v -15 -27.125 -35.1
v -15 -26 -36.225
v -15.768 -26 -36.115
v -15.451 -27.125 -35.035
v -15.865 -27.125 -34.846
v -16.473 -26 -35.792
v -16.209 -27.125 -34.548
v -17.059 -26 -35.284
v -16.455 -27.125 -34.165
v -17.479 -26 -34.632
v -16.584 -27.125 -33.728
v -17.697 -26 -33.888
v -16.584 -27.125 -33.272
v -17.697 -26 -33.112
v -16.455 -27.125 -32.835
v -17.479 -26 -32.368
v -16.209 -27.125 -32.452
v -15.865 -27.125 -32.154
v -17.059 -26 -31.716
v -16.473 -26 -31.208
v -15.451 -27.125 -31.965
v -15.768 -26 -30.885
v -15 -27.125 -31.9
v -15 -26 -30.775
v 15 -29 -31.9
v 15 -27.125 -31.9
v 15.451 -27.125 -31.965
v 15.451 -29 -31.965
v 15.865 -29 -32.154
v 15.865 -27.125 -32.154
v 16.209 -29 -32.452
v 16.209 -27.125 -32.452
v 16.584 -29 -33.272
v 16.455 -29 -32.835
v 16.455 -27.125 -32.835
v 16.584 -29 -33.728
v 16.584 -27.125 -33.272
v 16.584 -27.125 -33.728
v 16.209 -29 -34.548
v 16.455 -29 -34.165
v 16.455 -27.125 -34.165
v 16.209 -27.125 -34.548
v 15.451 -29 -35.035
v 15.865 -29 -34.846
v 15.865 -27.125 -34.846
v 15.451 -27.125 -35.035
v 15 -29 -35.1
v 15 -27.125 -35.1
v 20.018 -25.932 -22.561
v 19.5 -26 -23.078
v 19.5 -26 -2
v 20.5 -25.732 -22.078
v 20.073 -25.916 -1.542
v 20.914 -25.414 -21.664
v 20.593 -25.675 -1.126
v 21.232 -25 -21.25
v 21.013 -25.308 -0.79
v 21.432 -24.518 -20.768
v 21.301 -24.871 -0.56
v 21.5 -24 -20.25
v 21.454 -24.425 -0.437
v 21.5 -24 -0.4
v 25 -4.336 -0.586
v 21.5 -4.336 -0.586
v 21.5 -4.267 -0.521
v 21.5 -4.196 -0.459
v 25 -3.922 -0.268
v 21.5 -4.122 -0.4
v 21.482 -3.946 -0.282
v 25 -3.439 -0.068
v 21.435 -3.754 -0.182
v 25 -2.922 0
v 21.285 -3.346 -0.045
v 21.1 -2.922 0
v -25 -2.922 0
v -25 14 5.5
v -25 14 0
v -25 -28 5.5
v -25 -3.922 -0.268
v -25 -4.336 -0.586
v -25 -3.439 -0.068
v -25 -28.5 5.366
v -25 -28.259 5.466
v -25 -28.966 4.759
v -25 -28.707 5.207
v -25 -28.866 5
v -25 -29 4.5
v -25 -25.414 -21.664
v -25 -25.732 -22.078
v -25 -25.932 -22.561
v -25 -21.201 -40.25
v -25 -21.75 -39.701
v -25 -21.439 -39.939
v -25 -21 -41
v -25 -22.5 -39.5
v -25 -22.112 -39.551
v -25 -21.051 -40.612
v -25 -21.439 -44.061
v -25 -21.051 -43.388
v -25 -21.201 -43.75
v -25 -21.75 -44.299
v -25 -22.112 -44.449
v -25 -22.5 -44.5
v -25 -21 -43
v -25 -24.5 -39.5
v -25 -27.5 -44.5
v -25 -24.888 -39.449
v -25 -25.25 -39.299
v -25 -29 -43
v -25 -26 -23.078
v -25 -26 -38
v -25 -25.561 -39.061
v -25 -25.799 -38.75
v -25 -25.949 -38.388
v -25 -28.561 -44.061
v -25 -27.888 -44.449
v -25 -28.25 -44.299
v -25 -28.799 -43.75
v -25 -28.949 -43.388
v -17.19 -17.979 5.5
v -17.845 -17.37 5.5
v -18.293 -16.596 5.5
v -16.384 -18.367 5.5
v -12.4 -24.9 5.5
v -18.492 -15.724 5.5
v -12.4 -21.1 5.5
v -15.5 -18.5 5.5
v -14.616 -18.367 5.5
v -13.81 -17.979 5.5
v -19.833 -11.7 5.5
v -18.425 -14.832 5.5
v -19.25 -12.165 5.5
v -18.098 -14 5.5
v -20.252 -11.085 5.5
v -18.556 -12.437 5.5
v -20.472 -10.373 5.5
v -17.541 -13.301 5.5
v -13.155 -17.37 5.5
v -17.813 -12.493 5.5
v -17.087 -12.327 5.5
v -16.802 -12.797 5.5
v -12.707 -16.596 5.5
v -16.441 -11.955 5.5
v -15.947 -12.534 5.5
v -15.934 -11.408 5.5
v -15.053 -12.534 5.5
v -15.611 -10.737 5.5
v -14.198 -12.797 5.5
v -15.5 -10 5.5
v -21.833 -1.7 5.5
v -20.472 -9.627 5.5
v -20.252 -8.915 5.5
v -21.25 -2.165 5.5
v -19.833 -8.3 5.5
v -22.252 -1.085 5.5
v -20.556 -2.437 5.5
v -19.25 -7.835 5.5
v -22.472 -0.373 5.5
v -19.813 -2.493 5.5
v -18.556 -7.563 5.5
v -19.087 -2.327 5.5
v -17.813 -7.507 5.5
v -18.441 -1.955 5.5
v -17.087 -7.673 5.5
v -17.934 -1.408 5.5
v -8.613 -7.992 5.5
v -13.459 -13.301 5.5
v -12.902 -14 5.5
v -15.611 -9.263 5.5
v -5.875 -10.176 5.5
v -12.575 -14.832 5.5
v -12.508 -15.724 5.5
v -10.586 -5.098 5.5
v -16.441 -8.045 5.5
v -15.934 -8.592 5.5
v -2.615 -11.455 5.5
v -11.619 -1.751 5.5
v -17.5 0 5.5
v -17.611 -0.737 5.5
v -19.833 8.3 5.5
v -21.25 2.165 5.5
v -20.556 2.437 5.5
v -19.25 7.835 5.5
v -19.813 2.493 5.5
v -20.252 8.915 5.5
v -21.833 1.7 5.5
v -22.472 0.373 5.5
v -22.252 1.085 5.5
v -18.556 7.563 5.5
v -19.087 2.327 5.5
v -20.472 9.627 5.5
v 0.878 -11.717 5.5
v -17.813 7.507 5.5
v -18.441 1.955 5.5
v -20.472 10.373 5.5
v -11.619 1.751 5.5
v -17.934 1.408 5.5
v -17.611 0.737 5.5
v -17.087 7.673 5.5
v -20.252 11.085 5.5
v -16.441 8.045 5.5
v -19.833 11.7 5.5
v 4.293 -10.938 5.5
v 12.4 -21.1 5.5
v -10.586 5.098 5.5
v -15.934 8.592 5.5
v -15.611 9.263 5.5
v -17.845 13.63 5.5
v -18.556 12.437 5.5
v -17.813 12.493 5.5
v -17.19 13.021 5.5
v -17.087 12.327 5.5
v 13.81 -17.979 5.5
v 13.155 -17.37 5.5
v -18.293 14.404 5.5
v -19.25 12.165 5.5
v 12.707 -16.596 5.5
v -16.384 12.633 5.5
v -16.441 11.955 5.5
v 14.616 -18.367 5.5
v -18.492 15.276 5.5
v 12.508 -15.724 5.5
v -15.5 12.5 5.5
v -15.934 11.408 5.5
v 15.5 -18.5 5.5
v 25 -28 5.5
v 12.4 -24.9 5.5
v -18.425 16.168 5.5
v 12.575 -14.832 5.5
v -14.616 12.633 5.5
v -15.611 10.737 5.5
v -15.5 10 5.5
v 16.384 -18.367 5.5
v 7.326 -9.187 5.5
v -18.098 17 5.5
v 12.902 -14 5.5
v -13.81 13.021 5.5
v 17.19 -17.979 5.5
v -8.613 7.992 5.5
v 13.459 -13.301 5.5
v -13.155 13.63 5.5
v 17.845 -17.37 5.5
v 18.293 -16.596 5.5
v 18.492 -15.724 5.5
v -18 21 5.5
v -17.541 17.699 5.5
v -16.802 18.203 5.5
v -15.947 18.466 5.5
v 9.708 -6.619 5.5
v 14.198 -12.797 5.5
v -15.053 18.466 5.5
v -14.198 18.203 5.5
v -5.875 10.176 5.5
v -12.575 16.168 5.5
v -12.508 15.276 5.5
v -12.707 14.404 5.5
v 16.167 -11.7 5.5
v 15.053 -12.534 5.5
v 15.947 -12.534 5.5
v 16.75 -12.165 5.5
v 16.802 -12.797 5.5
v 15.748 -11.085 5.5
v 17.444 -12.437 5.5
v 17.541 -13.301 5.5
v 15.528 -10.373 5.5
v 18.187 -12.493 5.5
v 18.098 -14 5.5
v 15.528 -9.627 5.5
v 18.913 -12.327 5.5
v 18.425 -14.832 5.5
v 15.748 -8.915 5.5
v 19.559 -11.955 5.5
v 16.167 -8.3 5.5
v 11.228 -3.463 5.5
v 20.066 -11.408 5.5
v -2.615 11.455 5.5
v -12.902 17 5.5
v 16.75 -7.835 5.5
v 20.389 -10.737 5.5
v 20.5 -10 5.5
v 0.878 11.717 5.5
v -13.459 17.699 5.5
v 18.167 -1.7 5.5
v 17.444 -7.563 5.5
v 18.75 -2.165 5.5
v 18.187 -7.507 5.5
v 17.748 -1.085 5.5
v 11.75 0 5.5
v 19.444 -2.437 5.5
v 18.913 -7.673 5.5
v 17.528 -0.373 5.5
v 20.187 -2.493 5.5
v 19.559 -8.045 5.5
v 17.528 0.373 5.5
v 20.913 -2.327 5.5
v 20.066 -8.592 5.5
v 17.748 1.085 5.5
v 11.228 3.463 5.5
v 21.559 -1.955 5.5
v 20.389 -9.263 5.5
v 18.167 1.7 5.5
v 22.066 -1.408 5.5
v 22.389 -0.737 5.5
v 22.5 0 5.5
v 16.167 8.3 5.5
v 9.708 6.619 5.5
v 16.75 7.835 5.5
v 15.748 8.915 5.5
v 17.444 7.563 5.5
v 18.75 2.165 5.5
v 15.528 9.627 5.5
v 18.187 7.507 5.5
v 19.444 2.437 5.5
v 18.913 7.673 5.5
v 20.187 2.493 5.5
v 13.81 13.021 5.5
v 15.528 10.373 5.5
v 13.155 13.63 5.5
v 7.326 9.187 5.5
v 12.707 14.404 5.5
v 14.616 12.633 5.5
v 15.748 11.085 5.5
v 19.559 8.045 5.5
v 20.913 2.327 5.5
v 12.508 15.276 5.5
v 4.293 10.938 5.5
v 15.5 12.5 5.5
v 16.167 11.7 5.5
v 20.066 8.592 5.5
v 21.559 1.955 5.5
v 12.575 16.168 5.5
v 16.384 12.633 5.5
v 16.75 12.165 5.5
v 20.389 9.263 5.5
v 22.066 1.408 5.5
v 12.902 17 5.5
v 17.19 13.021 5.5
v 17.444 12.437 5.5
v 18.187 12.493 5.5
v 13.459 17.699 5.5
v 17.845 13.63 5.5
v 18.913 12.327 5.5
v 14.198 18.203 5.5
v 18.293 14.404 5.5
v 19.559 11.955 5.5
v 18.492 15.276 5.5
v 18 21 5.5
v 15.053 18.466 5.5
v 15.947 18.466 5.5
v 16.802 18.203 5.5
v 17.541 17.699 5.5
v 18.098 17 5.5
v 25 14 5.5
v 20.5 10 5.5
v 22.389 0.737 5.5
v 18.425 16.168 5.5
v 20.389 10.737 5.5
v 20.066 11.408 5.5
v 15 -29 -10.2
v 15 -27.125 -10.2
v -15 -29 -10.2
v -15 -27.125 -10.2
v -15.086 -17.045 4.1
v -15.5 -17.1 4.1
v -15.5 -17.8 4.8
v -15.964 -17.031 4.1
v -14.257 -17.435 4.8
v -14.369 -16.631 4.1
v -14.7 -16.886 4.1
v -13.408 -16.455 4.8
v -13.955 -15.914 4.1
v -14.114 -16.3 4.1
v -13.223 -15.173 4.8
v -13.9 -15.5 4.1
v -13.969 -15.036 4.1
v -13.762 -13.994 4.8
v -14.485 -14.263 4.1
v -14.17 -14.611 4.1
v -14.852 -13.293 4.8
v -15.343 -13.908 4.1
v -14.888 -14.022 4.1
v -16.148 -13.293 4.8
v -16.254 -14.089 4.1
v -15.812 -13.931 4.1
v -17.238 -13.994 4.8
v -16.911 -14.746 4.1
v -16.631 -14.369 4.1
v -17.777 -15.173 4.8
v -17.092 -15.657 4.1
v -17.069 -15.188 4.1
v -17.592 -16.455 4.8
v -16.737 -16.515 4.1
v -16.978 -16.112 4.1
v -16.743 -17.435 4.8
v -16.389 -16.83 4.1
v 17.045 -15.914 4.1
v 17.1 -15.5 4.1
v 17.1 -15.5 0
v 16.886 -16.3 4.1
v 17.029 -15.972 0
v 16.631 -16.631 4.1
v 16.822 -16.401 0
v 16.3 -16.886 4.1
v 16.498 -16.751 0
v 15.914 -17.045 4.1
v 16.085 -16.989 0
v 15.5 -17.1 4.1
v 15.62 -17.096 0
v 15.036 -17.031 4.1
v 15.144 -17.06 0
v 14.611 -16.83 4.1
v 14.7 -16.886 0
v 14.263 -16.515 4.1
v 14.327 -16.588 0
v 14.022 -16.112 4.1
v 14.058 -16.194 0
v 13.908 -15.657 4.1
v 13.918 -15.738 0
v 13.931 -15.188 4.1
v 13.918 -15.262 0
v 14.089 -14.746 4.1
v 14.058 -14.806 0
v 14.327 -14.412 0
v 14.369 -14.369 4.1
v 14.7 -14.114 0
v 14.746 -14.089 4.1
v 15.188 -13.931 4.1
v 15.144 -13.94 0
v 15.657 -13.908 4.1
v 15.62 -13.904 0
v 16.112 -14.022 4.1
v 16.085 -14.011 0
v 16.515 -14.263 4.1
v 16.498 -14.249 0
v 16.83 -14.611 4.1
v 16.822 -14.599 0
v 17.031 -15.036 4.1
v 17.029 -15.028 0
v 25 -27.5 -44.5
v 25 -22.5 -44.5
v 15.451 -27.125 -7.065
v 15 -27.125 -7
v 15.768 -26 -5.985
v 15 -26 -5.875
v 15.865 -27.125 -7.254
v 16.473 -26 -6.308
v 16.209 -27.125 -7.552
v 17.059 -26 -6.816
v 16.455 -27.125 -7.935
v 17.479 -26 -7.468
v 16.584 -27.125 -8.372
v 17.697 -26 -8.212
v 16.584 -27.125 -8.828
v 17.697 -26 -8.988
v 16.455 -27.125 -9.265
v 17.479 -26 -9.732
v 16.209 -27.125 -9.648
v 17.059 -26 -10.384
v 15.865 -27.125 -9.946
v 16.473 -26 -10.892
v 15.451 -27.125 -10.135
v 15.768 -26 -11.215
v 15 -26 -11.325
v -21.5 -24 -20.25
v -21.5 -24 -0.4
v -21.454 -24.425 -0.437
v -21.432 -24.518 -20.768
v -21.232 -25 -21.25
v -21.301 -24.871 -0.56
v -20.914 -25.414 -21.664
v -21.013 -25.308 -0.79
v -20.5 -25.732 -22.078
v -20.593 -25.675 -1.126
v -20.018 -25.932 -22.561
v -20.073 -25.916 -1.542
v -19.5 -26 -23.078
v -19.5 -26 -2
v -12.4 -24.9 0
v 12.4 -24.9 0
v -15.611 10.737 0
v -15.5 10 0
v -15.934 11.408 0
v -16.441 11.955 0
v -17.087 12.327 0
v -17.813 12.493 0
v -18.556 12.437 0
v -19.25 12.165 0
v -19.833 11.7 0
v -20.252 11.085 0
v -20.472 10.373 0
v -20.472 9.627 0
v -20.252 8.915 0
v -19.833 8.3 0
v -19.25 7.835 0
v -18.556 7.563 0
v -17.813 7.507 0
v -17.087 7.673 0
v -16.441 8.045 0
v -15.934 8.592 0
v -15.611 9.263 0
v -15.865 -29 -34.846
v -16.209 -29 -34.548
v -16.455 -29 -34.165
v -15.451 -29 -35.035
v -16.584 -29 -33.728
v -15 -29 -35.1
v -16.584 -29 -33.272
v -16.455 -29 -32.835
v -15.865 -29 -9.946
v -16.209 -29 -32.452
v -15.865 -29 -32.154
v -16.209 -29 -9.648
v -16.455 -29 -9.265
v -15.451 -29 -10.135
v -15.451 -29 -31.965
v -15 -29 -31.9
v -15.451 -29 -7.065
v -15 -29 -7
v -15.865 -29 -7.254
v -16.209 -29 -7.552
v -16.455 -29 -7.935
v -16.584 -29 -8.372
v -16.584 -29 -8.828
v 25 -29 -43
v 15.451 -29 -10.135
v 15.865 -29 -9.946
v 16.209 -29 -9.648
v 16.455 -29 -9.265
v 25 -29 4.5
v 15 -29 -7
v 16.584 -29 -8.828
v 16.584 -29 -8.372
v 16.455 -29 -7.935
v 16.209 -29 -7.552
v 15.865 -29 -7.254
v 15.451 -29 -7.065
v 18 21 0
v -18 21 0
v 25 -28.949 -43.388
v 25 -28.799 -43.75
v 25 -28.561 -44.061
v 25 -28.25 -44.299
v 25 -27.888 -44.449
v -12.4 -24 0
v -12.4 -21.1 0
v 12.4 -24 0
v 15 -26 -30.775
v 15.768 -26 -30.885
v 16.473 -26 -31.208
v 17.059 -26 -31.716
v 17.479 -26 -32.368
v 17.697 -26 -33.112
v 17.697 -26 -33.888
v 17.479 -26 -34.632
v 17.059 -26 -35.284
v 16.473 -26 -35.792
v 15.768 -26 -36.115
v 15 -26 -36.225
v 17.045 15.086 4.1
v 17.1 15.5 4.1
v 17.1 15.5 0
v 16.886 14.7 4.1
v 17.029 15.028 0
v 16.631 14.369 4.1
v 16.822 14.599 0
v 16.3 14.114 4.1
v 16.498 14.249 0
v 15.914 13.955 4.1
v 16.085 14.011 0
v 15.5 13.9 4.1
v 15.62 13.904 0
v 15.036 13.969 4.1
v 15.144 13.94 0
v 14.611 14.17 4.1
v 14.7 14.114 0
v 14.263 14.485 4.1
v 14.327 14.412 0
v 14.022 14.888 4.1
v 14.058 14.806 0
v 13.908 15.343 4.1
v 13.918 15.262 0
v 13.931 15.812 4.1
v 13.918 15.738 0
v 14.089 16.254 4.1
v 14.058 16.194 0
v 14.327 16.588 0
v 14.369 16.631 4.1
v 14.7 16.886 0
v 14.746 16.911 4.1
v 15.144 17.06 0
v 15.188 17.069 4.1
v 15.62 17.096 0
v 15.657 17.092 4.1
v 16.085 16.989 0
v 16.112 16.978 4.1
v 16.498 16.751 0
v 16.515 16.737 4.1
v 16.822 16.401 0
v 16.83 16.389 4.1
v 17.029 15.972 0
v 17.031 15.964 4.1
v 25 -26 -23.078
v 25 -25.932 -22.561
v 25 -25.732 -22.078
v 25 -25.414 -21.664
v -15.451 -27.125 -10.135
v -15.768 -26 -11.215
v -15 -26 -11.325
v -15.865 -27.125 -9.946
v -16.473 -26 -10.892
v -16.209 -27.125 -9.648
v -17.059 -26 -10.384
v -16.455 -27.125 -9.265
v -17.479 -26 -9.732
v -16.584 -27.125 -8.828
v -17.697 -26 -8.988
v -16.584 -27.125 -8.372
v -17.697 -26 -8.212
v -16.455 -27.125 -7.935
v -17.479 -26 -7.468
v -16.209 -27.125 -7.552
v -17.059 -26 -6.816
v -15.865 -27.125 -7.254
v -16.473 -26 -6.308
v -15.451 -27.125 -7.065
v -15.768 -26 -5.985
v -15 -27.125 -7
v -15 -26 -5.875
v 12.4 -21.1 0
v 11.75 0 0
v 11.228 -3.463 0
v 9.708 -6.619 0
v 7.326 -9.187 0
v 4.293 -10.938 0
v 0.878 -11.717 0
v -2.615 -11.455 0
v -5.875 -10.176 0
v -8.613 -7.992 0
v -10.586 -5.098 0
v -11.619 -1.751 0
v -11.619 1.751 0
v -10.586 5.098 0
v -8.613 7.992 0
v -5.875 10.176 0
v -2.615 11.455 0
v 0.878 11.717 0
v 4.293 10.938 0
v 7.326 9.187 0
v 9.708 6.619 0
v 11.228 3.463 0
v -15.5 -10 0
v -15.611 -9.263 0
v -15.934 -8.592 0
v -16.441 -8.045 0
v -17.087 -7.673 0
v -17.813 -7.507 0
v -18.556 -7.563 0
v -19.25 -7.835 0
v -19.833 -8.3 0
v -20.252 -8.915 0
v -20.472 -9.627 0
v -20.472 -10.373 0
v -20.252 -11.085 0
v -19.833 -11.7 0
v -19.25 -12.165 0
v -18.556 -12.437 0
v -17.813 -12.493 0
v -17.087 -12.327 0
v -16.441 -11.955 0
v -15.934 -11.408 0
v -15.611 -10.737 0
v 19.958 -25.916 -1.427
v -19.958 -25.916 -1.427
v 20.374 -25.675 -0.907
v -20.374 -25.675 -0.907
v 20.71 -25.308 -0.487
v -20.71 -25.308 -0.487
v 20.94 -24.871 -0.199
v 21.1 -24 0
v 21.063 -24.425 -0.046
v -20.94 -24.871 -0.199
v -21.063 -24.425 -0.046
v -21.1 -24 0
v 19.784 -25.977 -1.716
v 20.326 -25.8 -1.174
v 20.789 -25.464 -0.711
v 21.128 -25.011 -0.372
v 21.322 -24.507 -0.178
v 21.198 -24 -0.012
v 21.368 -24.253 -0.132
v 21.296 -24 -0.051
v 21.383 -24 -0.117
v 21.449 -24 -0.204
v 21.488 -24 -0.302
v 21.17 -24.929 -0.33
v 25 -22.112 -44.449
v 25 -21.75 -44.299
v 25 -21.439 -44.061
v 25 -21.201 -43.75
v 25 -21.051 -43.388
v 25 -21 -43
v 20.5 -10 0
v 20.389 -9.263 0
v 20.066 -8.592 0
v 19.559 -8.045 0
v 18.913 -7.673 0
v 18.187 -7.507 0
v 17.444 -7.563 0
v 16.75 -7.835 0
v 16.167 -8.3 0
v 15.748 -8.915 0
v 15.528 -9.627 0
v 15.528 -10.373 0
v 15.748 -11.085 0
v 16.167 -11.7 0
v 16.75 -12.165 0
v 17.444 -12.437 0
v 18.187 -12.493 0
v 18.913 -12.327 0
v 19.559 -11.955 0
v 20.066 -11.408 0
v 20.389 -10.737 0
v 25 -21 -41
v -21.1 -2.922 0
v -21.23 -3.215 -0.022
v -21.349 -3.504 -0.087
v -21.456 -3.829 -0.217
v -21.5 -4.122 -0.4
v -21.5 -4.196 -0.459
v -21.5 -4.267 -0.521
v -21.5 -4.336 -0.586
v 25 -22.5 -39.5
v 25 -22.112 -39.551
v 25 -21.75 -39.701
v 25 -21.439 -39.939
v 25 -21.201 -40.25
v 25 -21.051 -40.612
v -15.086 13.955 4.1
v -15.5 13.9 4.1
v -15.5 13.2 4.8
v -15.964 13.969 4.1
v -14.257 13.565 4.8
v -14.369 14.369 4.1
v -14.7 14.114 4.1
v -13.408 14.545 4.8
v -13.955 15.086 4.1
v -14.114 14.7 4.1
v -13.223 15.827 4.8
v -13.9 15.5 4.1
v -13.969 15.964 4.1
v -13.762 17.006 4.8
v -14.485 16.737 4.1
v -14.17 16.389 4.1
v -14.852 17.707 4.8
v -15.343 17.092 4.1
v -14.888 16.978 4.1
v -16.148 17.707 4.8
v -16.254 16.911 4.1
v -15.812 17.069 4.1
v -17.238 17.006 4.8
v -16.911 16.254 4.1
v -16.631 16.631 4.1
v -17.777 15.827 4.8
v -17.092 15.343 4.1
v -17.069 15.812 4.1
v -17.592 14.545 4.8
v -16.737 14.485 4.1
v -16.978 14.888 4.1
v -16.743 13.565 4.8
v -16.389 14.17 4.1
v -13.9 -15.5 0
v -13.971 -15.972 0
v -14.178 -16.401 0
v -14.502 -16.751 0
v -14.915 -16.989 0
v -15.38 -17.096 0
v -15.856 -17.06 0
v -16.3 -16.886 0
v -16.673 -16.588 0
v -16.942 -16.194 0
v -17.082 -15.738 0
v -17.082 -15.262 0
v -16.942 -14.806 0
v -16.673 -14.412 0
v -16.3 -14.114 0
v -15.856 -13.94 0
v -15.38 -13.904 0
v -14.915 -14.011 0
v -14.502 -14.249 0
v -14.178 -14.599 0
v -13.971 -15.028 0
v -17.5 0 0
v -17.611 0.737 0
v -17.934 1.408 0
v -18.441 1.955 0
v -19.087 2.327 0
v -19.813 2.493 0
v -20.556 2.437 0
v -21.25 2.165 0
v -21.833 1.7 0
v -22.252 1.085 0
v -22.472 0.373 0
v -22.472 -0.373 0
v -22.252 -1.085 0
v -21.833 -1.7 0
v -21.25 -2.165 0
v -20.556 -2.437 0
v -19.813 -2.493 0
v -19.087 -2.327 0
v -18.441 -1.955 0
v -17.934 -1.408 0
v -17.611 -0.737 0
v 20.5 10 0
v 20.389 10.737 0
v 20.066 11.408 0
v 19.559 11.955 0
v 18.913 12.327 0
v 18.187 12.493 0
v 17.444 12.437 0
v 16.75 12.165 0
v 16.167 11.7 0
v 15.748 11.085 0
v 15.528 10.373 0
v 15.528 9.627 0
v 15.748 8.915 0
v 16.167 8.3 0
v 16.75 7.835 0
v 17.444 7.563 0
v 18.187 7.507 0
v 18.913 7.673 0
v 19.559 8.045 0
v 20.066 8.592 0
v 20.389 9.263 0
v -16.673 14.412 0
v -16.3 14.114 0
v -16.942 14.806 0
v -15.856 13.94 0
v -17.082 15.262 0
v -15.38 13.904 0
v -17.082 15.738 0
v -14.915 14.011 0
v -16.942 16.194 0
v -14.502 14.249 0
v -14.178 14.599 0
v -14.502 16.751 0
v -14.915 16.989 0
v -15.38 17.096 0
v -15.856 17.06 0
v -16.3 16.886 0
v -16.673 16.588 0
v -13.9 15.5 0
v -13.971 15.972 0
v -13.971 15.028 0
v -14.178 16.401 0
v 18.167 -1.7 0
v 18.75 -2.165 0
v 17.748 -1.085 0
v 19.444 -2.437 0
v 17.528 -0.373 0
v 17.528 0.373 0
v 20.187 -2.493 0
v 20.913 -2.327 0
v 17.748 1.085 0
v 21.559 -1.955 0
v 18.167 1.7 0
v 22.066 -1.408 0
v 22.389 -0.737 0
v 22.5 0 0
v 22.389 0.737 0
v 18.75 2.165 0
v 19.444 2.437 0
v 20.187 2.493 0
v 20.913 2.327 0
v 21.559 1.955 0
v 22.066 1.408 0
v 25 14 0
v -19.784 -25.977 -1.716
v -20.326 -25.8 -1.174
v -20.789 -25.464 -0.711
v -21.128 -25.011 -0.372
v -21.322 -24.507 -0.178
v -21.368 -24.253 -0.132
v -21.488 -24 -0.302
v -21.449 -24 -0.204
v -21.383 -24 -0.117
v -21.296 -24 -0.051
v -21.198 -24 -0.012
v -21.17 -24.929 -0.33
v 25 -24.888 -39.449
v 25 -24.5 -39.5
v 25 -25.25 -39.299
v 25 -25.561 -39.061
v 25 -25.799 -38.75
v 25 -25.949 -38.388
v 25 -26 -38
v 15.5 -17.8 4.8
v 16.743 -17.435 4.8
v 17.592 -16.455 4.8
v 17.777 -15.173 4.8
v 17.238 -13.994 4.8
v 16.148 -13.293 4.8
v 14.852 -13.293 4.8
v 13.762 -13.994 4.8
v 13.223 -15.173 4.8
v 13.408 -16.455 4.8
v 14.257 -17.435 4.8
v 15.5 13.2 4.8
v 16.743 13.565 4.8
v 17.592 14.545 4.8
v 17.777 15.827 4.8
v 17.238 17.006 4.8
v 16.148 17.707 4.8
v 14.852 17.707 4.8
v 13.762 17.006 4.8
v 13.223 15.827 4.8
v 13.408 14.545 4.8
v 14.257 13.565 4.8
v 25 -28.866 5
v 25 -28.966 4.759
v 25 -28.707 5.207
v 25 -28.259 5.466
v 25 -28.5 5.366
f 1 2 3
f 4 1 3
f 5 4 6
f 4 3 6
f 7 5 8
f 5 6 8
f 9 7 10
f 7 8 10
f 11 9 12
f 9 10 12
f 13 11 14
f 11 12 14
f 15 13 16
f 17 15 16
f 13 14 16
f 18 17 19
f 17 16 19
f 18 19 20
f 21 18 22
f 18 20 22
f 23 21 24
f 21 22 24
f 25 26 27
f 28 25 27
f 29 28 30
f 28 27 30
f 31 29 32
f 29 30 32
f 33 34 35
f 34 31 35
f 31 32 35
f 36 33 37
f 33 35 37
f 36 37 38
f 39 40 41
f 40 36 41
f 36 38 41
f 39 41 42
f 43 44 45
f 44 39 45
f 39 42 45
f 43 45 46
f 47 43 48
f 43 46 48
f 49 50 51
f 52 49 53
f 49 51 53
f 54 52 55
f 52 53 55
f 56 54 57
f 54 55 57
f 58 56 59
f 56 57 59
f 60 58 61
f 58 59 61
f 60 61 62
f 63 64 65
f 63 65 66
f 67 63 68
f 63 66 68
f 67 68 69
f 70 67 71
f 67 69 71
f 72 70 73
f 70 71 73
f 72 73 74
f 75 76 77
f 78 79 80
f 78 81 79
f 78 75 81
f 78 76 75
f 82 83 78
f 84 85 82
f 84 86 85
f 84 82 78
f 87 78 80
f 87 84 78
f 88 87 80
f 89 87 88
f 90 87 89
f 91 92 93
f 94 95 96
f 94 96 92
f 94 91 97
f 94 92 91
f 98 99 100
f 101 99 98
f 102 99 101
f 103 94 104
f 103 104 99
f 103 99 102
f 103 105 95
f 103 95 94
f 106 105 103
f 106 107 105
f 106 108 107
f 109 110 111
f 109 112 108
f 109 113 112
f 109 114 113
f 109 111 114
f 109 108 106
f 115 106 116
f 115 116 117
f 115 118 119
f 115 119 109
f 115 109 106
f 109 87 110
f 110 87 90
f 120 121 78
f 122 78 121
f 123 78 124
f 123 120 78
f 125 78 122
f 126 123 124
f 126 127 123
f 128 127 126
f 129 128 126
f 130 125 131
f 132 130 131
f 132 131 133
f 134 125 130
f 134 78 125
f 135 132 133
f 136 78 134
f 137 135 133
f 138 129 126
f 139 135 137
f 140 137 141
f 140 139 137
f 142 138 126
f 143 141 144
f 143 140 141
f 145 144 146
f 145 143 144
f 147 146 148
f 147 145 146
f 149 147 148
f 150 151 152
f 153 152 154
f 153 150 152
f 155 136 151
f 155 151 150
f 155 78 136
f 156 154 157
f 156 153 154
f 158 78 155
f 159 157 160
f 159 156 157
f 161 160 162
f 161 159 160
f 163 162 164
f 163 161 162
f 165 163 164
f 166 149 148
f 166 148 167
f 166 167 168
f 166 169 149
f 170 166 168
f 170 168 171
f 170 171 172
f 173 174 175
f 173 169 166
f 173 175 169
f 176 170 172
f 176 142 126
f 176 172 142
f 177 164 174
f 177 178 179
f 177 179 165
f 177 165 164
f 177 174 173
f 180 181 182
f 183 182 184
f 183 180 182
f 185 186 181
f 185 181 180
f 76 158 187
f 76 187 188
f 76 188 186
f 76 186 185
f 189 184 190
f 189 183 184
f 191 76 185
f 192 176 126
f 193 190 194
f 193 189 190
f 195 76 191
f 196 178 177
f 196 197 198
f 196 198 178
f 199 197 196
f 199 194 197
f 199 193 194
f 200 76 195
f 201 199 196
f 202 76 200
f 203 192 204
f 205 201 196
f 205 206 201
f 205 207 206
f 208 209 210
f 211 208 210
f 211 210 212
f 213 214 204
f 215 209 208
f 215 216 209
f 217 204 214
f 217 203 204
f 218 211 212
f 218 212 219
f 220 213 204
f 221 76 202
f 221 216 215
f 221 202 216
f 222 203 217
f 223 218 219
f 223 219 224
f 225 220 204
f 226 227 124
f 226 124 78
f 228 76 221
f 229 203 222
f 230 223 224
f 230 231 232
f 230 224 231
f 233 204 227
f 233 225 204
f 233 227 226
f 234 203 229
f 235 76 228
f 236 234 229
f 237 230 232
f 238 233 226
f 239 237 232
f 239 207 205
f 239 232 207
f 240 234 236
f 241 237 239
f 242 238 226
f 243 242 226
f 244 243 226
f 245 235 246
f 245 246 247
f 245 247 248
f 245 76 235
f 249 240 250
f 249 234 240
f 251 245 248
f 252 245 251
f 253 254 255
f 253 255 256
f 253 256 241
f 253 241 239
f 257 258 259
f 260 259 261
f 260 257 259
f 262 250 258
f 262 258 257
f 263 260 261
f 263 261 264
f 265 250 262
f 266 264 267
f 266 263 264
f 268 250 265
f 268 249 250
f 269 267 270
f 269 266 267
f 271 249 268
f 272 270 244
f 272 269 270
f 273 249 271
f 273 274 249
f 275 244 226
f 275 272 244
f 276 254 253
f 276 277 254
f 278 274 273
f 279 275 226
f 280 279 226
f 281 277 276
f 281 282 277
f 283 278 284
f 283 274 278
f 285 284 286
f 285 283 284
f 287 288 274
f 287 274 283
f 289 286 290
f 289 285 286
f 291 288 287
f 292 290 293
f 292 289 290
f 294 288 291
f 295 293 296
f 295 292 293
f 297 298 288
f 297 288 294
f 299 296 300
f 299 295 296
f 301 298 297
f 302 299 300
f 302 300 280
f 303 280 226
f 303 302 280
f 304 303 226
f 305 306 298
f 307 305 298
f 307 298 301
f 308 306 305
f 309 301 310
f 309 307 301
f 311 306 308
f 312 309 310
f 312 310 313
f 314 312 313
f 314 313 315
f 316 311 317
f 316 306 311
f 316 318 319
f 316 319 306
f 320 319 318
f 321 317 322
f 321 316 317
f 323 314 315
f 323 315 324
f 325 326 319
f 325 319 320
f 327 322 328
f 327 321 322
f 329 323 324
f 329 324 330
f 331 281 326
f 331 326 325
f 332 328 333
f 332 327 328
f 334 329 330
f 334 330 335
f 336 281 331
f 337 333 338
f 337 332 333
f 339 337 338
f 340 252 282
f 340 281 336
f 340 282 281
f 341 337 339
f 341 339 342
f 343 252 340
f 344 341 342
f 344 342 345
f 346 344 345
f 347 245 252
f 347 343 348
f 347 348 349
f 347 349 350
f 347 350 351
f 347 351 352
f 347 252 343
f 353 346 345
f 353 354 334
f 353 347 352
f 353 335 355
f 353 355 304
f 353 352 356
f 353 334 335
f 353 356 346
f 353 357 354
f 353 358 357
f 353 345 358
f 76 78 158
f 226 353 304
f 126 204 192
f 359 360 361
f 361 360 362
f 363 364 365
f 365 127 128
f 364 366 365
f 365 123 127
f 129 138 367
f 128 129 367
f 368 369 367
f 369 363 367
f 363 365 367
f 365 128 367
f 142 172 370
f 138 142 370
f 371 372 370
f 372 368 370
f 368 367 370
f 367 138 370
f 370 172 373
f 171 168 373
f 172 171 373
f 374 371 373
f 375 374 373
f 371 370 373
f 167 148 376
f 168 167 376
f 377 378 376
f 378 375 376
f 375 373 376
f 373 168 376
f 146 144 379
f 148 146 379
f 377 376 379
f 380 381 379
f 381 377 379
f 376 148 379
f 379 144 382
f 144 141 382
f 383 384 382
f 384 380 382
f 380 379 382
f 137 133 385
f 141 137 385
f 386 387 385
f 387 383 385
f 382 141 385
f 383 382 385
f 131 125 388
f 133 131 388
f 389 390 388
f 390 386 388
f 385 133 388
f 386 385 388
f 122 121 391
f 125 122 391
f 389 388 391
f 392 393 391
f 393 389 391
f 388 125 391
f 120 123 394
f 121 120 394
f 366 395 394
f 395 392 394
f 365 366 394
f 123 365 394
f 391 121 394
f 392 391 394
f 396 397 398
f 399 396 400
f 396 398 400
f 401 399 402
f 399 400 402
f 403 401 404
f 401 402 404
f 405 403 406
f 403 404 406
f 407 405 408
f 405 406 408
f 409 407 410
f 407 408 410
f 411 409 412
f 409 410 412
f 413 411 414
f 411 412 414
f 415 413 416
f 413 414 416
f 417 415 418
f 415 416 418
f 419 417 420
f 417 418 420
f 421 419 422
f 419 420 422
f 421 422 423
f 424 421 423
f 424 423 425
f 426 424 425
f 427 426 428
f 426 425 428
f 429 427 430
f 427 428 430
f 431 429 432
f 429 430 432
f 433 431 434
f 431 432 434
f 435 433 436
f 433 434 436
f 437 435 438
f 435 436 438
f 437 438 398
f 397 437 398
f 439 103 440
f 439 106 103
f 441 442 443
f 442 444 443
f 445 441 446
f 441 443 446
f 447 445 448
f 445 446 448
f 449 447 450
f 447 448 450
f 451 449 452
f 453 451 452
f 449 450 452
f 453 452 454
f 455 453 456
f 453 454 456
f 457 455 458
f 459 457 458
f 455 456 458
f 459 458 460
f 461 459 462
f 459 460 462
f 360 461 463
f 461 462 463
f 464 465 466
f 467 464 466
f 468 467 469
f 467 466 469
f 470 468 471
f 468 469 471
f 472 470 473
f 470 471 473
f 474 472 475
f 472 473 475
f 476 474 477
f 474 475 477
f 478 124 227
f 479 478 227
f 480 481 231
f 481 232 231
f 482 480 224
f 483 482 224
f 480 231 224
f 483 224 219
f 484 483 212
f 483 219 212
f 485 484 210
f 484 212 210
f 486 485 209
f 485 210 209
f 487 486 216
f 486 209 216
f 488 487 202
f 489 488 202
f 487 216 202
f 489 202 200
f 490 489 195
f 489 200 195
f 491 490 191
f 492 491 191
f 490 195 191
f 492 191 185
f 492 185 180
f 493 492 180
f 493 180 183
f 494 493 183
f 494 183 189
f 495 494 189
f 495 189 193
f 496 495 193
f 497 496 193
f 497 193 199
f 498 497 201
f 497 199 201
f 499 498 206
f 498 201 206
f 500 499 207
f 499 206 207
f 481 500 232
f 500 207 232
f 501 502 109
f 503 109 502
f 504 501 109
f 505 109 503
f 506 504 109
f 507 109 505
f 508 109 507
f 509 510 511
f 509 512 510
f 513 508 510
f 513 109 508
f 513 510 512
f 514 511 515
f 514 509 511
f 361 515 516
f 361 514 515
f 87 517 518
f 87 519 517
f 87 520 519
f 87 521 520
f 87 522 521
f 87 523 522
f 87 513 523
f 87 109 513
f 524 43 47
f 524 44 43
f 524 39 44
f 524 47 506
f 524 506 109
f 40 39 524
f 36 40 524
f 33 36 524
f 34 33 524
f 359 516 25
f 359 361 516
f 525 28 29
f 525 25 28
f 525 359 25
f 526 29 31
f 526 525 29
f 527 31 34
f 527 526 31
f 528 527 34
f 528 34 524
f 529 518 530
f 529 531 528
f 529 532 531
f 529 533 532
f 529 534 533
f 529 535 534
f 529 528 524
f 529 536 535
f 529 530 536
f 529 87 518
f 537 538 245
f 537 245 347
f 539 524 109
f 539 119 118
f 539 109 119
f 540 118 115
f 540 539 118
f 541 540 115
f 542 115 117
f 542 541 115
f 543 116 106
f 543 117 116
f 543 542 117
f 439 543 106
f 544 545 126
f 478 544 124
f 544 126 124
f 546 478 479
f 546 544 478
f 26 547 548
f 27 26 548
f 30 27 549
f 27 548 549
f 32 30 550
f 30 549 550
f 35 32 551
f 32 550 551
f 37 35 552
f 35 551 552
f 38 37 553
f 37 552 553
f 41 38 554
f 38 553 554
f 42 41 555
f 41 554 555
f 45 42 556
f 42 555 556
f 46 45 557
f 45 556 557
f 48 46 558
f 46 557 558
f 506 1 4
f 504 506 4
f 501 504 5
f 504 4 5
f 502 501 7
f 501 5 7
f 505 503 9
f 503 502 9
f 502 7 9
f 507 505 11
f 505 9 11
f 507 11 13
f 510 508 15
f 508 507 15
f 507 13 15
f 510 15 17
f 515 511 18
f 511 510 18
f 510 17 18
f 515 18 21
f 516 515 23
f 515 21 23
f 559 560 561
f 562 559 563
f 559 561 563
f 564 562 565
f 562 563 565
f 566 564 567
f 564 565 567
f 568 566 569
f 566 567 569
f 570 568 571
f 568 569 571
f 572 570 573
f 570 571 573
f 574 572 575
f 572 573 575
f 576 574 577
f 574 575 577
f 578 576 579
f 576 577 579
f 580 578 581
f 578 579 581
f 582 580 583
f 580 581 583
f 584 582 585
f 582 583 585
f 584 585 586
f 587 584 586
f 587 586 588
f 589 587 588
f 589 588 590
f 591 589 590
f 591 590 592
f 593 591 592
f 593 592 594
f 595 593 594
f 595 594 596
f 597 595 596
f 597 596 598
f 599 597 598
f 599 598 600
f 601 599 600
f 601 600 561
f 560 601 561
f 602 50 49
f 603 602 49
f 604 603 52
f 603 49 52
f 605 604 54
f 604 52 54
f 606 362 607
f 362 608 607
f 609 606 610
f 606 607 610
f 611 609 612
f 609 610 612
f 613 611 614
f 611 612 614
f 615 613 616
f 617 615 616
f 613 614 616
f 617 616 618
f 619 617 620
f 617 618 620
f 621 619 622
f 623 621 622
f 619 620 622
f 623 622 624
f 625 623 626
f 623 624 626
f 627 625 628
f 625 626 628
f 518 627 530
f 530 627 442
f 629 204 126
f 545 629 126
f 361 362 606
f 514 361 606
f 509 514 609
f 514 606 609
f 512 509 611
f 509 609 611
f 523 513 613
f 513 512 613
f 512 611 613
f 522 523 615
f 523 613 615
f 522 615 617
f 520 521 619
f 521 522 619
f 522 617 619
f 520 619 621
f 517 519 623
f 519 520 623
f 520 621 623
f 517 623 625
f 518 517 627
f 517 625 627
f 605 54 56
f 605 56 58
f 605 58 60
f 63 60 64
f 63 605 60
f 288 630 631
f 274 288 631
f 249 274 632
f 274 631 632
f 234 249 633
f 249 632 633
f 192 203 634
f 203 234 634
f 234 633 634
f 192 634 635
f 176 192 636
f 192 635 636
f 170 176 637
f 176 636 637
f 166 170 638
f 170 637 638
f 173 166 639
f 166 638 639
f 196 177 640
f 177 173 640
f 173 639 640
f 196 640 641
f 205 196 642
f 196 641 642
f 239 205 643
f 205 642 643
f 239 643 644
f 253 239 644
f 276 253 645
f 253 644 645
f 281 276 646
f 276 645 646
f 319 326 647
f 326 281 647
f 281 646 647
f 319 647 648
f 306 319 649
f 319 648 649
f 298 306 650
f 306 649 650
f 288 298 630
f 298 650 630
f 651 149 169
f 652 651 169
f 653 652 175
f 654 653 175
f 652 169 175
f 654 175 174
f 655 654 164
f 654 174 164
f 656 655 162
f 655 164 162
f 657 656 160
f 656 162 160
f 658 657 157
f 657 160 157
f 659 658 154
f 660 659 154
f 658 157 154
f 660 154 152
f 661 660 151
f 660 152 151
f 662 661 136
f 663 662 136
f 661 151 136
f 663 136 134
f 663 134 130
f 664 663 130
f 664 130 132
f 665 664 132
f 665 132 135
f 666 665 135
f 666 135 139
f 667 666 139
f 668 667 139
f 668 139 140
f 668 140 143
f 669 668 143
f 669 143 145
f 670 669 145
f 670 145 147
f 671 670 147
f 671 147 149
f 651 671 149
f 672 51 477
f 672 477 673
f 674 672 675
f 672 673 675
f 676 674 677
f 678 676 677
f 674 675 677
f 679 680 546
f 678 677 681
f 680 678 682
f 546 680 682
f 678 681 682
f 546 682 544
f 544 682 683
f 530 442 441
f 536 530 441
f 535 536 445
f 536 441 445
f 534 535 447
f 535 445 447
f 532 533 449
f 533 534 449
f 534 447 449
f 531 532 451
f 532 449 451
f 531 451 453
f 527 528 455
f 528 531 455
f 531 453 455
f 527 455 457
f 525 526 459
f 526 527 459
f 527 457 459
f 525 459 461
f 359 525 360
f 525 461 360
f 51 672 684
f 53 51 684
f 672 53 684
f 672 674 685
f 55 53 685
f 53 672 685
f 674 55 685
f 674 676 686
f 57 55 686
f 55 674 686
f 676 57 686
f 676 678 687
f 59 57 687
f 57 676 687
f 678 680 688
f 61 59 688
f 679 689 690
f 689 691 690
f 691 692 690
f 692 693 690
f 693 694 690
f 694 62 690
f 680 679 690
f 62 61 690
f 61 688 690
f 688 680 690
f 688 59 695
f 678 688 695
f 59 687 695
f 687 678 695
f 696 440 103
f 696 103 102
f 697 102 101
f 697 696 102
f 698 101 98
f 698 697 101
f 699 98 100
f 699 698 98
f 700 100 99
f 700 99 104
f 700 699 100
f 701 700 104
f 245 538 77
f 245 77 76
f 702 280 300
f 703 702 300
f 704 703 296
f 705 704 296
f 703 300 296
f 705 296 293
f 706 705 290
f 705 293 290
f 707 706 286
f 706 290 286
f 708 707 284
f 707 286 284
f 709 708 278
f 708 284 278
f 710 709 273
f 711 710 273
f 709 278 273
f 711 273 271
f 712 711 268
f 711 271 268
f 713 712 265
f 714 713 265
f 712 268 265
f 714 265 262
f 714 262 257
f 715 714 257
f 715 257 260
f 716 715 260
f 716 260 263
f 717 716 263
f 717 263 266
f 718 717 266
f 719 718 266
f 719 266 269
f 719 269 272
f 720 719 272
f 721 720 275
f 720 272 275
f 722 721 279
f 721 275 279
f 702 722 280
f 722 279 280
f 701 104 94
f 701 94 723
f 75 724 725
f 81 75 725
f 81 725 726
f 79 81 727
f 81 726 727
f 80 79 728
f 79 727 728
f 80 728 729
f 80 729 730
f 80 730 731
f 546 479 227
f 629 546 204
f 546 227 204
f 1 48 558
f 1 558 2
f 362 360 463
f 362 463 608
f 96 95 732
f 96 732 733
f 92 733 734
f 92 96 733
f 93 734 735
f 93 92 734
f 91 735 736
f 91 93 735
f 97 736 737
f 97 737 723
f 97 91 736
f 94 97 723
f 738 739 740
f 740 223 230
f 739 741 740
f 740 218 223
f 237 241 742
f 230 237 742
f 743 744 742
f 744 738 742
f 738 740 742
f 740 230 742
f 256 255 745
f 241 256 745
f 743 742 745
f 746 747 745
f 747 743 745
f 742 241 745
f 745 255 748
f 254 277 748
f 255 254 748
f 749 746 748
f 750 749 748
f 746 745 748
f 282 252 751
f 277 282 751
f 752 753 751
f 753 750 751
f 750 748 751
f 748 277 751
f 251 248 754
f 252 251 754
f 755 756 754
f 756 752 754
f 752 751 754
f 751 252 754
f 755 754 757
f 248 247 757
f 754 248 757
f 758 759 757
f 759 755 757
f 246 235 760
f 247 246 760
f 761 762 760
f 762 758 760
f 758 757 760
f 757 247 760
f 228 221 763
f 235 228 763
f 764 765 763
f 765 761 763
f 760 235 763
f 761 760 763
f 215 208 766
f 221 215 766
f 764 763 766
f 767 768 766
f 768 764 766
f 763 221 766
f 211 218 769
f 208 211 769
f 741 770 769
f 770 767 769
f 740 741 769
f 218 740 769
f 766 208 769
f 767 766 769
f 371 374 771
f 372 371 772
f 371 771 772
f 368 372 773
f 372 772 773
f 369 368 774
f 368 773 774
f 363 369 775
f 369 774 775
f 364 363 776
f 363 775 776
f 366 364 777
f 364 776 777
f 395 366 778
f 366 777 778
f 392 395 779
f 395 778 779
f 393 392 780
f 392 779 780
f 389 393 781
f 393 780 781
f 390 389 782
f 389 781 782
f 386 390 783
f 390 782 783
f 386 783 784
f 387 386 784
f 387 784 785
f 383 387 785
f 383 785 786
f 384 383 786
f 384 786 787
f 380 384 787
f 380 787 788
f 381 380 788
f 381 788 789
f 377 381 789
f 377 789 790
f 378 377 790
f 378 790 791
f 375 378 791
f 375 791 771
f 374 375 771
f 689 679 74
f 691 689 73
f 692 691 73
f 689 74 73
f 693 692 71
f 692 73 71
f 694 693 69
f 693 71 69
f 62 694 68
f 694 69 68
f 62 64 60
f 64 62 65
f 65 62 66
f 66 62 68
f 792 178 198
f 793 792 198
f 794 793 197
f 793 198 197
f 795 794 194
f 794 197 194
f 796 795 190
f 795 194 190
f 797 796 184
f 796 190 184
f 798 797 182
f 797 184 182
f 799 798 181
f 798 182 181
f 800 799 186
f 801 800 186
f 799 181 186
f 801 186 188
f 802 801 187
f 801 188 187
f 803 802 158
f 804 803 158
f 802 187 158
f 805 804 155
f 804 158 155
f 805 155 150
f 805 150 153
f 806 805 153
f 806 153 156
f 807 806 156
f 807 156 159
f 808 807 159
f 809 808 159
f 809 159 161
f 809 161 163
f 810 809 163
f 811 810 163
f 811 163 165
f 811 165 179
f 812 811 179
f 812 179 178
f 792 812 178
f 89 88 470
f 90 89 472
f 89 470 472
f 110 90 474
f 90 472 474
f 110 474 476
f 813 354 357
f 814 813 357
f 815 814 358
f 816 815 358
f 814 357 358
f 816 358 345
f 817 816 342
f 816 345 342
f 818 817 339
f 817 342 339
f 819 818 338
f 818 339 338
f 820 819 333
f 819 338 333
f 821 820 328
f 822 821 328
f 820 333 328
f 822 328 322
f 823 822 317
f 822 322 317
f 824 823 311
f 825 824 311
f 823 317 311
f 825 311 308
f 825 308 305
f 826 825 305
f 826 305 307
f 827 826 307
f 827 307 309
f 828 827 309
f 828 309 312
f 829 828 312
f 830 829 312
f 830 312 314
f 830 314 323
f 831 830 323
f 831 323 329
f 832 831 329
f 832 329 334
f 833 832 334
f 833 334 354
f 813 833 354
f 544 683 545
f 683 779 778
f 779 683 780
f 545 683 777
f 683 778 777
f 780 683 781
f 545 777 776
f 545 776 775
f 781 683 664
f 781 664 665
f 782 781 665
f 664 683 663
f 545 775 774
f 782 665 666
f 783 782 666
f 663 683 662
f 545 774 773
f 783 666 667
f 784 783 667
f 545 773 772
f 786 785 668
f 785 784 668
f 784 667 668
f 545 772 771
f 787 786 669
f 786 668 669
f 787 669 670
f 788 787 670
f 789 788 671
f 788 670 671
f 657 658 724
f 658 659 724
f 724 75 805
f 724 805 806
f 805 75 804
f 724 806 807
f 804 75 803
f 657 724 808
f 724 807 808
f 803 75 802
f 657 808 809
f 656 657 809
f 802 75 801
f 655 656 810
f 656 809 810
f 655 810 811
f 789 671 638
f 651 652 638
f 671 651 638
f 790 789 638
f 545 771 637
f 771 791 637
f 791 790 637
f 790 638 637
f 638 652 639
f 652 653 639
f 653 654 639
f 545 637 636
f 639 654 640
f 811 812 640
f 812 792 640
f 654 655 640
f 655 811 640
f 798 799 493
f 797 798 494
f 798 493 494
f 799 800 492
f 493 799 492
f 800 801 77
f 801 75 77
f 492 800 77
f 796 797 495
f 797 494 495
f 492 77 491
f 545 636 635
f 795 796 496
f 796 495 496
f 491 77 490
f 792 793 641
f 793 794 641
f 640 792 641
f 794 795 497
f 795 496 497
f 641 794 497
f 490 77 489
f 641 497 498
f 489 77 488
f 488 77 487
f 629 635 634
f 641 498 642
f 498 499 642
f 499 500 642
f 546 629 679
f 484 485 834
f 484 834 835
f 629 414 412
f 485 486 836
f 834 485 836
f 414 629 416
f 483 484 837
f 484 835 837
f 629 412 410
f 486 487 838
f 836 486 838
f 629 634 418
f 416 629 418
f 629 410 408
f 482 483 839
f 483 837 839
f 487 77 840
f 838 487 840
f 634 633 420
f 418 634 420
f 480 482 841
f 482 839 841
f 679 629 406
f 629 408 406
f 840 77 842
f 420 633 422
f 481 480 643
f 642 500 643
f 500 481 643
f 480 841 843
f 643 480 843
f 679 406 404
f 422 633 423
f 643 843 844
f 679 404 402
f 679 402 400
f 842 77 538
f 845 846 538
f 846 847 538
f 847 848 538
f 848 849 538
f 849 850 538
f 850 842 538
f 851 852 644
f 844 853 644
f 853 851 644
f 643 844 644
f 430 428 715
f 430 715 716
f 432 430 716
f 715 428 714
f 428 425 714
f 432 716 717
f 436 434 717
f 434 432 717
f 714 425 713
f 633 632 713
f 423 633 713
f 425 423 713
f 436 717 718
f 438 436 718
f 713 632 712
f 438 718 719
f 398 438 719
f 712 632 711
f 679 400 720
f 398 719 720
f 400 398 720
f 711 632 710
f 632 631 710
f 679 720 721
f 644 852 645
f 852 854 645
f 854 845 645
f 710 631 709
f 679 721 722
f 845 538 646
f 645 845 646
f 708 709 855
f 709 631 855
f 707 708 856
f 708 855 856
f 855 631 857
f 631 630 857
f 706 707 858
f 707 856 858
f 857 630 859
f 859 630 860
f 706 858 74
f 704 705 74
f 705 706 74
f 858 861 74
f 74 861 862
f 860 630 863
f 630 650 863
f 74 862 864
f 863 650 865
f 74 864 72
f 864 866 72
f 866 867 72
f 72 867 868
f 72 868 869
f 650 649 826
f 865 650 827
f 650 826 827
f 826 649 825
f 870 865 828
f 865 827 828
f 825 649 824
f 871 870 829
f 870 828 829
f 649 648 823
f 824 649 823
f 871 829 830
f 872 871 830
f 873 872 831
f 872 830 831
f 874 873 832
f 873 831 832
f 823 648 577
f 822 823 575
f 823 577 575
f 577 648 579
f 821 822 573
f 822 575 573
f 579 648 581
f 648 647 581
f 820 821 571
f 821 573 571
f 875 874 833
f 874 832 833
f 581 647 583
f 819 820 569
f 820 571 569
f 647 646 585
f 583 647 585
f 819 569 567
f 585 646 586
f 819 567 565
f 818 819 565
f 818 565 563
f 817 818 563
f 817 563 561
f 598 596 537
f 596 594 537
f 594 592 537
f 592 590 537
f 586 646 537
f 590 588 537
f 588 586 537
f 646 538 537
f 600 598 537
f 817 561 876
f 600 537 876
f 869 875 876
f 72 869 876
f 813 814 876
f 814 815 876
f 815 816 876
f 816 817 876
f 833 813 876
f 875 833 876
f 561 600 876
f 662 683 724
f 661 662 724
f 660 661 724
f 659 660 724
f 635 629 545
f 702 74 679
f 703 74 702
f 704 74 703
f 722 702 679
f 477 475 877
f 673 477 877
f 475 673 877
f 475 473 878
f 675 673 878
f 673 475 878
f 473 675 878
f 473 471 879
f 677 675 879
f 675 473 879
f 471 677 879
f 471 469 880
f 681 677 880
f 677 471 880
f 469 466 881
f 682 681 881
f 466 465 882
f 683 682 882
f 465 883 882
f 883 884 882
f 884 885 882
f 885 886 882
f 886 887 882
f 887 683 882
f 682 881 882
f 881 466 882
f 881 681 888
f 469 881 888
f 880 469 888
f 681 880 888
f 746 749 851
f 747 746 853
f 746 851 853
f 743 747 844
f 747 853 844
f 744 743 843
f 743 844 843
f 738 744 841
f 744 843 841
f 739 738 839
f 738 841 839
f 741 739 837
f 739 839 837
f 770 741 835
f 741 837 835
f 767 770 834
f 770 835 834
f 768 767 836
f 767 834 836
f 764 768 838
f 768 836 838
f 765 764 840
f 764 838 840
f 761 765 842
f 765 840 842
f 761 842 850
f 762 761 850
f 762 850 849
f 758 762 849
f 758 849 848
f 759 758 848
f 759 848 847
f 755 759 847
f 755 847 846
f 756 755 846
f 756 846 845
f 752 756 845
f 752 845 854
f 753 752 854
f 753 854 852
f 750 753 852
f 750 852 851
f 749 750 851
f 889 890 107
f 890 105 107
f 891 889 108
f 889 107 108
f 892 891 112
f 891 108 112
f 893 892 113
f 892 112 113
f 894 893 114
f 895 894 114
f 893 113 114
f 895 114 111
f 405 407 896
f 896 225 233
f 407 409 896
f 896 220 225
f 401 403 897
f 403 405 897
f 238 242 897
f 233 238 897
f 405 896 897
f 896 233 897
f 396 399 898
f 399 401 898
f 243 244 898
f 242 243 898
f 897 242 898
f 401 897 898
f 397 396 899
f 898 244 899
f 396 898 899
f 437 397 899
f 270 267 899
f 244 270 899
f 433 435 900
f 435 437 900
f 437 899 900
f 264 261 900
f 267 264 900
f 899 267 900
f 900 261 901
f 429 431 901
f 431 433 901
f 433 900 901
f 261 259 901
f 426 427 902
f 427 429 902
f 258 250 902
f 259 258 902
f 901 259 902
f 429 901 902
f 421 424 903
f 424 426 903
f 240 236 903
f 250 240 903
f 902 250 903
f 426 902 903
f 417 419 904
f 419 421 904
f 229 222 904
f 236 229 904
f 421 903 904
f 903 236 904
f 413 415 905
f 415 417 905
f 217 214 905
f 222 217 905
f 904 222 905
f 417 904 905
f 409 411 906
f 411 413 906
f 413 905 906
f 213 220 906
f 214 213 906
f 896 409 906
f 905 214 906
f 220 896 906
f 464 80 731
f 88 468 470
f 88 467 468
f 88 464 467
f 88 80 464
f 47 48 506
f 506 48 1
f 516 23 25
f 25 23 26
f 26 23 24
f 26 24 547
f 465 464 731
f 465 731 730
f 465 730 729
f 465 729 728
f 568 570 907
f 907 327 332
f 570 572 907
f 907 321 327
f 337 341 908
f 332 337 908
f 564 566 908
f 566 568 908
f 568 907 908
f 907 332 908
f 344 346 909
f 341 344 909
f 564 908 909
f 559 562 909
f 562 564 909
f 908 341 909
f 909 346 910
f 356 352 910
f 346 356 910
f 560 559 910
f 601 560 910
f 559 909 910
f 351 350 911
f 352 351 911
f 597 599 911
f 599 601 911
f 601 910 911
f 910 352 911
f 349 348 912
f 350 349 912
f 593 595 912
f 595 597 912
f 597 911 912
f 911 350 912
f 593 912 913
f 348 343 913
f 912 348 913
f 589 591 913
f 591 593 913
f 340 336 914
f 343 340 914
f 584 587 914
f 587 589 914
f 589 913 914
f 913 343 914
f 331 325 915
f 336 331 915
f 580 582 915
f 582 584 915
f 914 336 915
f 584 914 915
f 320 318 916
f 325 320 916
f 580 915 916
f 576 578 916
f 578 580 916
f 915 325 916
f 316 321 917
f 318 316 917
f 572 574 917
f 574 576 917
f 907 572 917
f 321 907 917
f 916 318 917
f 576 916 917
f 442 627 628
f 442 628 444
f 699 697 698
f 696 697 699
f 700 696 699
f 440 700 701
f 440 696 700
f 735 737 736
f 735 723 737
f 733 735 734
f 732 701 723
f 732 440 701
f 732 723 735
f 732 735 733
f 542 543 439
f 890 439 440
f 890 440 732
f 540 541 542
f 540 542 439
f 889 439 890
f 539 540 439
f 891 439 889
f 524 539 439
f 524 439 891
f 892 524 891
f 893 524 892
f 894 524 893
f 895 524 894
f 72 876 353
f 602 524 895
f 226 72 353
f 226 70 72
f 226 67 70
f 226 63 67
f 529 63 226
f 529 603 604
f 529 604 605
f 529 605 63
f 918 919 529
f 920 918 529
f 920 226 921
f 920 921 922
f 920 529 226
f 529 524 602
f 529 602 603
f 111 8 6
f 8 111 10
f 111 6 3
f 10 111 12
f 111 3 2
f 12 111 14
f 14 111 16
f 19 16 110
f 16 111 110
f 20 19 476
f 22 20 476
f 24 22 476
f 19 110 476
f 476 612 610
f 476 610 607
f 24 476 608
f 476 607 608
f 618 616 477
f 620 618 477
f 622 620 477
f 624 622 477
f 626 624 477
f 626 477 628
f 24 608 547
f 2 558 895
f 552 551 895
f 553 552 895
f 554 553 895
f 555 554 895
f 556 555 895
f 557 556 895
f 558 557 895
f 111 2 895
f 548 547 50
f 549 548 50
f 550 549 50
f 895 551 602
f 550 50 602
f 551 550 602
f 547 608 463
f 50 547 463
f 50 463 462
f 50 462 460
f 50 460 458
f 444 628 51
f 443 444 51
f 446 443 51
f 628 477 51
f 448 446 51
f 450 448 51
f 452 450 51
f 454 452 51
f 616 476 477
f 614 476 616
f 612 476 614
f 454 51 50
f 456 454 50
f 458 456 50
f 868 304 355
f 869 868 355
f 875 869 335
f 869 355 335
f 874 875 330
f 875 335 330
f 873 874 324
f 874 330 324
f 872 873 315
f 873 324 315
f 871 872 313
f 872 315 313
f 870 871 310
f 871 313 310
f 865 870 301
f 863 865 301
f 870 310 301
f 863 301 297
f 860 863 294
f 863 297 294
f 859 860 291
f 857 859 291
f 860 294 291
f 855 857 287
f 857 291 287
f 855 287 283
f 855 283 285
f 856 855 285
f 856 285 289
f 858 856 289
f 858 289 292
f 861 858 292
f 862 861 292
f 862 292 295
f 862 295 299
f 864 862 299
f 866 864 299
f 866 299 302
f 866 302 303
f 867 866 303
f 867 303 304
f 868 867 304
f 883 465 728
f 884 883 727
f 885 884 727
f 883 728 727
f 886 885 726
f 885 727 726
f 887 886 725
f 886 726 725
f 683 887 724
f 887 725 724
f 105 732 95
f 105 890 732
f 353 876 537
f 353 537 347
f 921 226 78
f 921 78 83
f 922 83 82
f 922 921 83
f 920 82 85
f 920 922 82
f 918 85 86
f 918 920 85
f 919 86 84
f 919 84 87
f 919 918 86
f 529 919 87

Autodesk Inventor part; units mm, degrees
ref_plane "YZ Plane" through (0, 0, 0) normal (1, 0, 0) x (0, 1, 0)
ref_plane "XZ Plane" through (0, 0, 0) normal (0, 1, 0) x (-1, 0, 0)
ref_plane "XY Plane" through (0, 0, 0) normal (0, 0, 1) x (1, 0, 0)
sketch "Sketch1" plane through (0, 0, 0) normal (0, 0, 1) x (1, 0, 0)
  line L0 (-21, 21) -> (21, 21)
  line L1 (21, 21) -> (21, -21)
  line L2 (21, -21) -> (-21, -21)
  line L3 (-21, -21) -> (-21, 21)
  line L4 (-21, 21) -> (21, -21) construction
  line L5 (21, 21) -> (-21, -21) construction
  circle A0 centre (15.5, 15.5) radius 1.6
  circle A1 centre (15.5, -15.5) radius 1.6
  line L6 (0, 0) -> (0, 3.2399) construction
  circle A2 centre (-15.5, 15.5) radius 1.6
  circle A3 centre (-15.5, -15.5) radius 1.6
  circle A4 centre (0, 0) radius 11.75
  line L7 (-25, 21) -> (25, 21)
  line L8 (25, 21) -> (25, -26)
  line L9 (25, -26) -> (-25, -26)
  line L10 (-25, -26) -> (-25, 21)
  dimension "d0" = 42
  dimension "d1" = 42
  dimension "d2" = 31
  dimension "d3" = 3.2
  dimension "d4" = 3.2
  dimension "d5" = 23.5
  dimension "d9" = 4
  dimension "d10" = 4
  dimension "d11" = 5
extrude "Extrusion1" add sketch "Sketch1" along normal blind 5.5
sketch "Sketch2" plane through (-25, -26, 0) normal (0, -1, 0) x (1, 0, 0)
  line L0 (0, 5.5) -> (50, 5.5) projected
  line L1 (50, 5.5) -> (0, 5.5)
  line L2 (0, 5.5) -> (0, -44.5)
  line L3 (0, -44.5) -> (50, -44.5)
  line L4 (50, -44.5) -> (50, 5.5)
  line L5 (0, 0) -> (0, 5.5) projected
  line L6 (0, 0) -> (50, -44.5) construction
  line L7 (50, 0) -> (0, -44.5) construction
  line L8 (50, 0) -> (0, 0) projected
  line L9 (8.4, -33.5) -> (41.6, -33.5) construction
  line L10 (10, -31.9) -> (40, -31.9)
  line L11 (40, -35.1) -> (10, -35.1)
  arc A0 (10, -31.9) -> (10, -35.1) centre (10, -33.5) ccw
  arc A1 (40, -35.1) -> (40, -31.9) centre (40, -33.5) ccw
  line L12 (8.4, -8.6) -> (41.6, -8.6) construction
  line L13 (10, -7) -> (40, -7)
  line L14 (40, -10.2) -> (10, -10.2)
  arc A2 (10, -7) -> (10, -10.2) centre (10, -8.6) ccw
  arc A3 (40, -10.2) -> (40, -7) centre (40, -8.6) ccw
  point P0 (25, 0)
  point P1 (49.9436, 3)
  point P2 (25, -33.5)
  point P3 (25, -8.6)
  dimension "d12" = 50
  dimension "d71" = 1.6
  dimension "d72" = 1.6
  dimension "d73" = 25
  dimension "d74" = 25
  dimension "d75" = 30
  dimension "d76" = 30
  dimension "d78" = 7
  dimension "d86" = 11
extrude "Extrusion2" add sketch "Sketch2" along normal blind 3
sketch "Sketch5" plane through (25, 21, 5.5) normal (1, 0, 0) x (0, 0, -1)
  line L0 (50, -47) -> (5.5, -47) projected
  line L1 (27.75, -47) -> (5.5, -24.75)
  line L2 (5.5, -47) -> (5.5, 0) projected
  point P0 (5.5, -21)
  dimension "d20" = 45
extrude "Extrusion3" add sketch "Sketch5" against normal blind 3.5
mirror "Mirror1" about plane through (0, 0, 0) normal (1, 0, 0) of "Extrusion3"
fillet "Fillet1" radius 2 7 edges at (0, -26, 0) (-21.5, -26, -11.125) (21.5, -26, -11.125) (23.25, -26, -22.25) (23.25, -3.75, 0) (-23.25, -3.75, 0) (-23.25, -26, -22.25)
fillet "Fillet2" radius 0.4 4 edges at (-20.9142, -25.4142, -0.5858) (-21.5, -13.875, 0) (20.9142, -25.4142, -0.5858) (21.5, -13.875, 0)
sketch "Sketch6" plane through (-25, -26, 0) normal (0, 1, 0) x (1, 0, 0)
  line L0 (0, -5.5) -> (0, 44.5) projected
  line L1 (50, 44.5) -> (50, -5.5) projected
  line L2 (0, 44.5) -> (50, 44.5)
  line L3 (50, 44.5) -> (50, 39.5)
  line L4 (50, 39.5) -> (0, 39.5)
  line L5 (0, 39.5) -> (0, 44.5)
  point P0 (25, 0)
  point P1 (0, 39.5)
  dimension "d25" = 5
extrude "Extrusion4" add sketch "Sketch6" along normal blind 5
fillet "Fillet3" radius 1.5 4 edges at (0, -21, -39.5) (0, -21, -44.5) (0, -26, -39.5) (0, -29, -44.5)
sketch "Sketch7" plane through (0, 0, 5.5) normal (0, 0, 1) x (1, 0, 0)
  line L0 (25, 21) -> (-25, 21) projected
  line L1 (-25, 21) -> (-25, -29) projected
  line L2 (25, -29) -> (-25, -29) projected
  line L3 (25, 21) -> (25, -29) projected
  circle A0 centre (15.5, 15.5) radius 1.6 projected
  circle A1 centre (15.5, -15.5) radius 1.6 projected
  circle A2 centre (-15.5, 15.5) radius 1.6 projected
  circle A3 centre (-15.5, -15.5) radius 1.6 projected
  circle A4 centre (0, 0) radius 11.75 projected
  line L4 (35, 0) -> (-35, 0)
  line L5 (0, 0) -> (0, -3.907) construction
  line L6 (-12.4, -24.9) -> (12.4, -24.9)
  line L7 (12.4, -24.9) -> (12.4, -21.1)
  line L8 (12.4, -21.1) -> (-12.4, -21.1)
  line L9 (-12.4, -21.1) -> (-12.4, -24.9)
  line L10 (-12.4, -24.9) -> (12.4, -21.1) construction
  line L11 (12.4, -24.9) -> (-12.4, -21.1) construction
  circle A5 centre (-20, 0) radius 2.5
  circle A6 centre (-18, 10) radius 2.5
  circle A7 centre (-18, -10) radius 2.5
  circle A8 centre (18, -10) radius 2.5
  circle A9 centre (20, 0) radius 2.5
  circle A10 centre (18, 10) radius 2.5
  point P0 (0, -23)
  dimension "d94" = 3.8
  dimension "d95" = 23
  dimension "d96" = 24.8
  dimension "d97" = 12.4
  dimension "d98" = 5
  dimension "d99" = 5
  dimension "d100" = 5
  dimension "d101" = 10
  dimension "d102" = 10
  dimension "d103" = 2
  dimension "d104" = 2
  dimension "d105" = 20
extrude "Extrusion5" cut sketch "Sketch7" against normal up to surface (5.5 mm away) contours A9 L4 | L4 A9 | A5 L4 | L4 A5 | L9 L8 L7 L6 | A6 | A7 | A8 | A10
sketch "Sketch8" plane through (0, 0, 5.5) normal (0, 0, 1) x (1, 0, 0)
  circle A0 centre (-15.5, 15.5) radius 1.6 projected
  circle A1 centre (15.5, 15.5) radius 1.6 projected
  circle A2 centre (15.5, -15.5) radius 1.6 projected
  circle A3 centre (-15.5, -15.5) radius 1.6 projected
  point P0 (0, 0)
hole "Hole2" at (-15.5, 15.5, 5.5) at (15.5, 15.5, 5.5) at (15.5, -15.5, 5.5) at (-15.5, -15.5, 5.5) direction (0, 0, -1) diameter 3.2 depth 10 countersink diameter 6 countersink angle 90
chamfer "Chamfer1" distance 7 angle 45 2 edges at (-25, 21, 2.75) (25, 21, 2.75)
fillet "Fillet4" radius 1 1 edges at (0, -29, 5.5)
chamfer "Chamfer2" distance 1.125 angle 45 8 edges at (0, -26, -7) (16.6, -26, -8.6) (0, -26, -10.2) (-16.6, -26, -8.6) (0, -26, -31.9) (16.6, -26, -33.5) (0, -26, -35.1) (-16.6, -26, -33.5)
equation "\"d1\" = d0"
equation "\"d4\" = d3"
equation "\"d10\" = d9"
equation "\"d97\" = 0.5 * d96"
equation "\"d99\" = d98"
equation "\"d100\" = d99"
equation "\"d102\" = d101"
equation "\"d104\" = d103"
properties part number "Stepper Mount V4" material "Thermoplastic Resin"
